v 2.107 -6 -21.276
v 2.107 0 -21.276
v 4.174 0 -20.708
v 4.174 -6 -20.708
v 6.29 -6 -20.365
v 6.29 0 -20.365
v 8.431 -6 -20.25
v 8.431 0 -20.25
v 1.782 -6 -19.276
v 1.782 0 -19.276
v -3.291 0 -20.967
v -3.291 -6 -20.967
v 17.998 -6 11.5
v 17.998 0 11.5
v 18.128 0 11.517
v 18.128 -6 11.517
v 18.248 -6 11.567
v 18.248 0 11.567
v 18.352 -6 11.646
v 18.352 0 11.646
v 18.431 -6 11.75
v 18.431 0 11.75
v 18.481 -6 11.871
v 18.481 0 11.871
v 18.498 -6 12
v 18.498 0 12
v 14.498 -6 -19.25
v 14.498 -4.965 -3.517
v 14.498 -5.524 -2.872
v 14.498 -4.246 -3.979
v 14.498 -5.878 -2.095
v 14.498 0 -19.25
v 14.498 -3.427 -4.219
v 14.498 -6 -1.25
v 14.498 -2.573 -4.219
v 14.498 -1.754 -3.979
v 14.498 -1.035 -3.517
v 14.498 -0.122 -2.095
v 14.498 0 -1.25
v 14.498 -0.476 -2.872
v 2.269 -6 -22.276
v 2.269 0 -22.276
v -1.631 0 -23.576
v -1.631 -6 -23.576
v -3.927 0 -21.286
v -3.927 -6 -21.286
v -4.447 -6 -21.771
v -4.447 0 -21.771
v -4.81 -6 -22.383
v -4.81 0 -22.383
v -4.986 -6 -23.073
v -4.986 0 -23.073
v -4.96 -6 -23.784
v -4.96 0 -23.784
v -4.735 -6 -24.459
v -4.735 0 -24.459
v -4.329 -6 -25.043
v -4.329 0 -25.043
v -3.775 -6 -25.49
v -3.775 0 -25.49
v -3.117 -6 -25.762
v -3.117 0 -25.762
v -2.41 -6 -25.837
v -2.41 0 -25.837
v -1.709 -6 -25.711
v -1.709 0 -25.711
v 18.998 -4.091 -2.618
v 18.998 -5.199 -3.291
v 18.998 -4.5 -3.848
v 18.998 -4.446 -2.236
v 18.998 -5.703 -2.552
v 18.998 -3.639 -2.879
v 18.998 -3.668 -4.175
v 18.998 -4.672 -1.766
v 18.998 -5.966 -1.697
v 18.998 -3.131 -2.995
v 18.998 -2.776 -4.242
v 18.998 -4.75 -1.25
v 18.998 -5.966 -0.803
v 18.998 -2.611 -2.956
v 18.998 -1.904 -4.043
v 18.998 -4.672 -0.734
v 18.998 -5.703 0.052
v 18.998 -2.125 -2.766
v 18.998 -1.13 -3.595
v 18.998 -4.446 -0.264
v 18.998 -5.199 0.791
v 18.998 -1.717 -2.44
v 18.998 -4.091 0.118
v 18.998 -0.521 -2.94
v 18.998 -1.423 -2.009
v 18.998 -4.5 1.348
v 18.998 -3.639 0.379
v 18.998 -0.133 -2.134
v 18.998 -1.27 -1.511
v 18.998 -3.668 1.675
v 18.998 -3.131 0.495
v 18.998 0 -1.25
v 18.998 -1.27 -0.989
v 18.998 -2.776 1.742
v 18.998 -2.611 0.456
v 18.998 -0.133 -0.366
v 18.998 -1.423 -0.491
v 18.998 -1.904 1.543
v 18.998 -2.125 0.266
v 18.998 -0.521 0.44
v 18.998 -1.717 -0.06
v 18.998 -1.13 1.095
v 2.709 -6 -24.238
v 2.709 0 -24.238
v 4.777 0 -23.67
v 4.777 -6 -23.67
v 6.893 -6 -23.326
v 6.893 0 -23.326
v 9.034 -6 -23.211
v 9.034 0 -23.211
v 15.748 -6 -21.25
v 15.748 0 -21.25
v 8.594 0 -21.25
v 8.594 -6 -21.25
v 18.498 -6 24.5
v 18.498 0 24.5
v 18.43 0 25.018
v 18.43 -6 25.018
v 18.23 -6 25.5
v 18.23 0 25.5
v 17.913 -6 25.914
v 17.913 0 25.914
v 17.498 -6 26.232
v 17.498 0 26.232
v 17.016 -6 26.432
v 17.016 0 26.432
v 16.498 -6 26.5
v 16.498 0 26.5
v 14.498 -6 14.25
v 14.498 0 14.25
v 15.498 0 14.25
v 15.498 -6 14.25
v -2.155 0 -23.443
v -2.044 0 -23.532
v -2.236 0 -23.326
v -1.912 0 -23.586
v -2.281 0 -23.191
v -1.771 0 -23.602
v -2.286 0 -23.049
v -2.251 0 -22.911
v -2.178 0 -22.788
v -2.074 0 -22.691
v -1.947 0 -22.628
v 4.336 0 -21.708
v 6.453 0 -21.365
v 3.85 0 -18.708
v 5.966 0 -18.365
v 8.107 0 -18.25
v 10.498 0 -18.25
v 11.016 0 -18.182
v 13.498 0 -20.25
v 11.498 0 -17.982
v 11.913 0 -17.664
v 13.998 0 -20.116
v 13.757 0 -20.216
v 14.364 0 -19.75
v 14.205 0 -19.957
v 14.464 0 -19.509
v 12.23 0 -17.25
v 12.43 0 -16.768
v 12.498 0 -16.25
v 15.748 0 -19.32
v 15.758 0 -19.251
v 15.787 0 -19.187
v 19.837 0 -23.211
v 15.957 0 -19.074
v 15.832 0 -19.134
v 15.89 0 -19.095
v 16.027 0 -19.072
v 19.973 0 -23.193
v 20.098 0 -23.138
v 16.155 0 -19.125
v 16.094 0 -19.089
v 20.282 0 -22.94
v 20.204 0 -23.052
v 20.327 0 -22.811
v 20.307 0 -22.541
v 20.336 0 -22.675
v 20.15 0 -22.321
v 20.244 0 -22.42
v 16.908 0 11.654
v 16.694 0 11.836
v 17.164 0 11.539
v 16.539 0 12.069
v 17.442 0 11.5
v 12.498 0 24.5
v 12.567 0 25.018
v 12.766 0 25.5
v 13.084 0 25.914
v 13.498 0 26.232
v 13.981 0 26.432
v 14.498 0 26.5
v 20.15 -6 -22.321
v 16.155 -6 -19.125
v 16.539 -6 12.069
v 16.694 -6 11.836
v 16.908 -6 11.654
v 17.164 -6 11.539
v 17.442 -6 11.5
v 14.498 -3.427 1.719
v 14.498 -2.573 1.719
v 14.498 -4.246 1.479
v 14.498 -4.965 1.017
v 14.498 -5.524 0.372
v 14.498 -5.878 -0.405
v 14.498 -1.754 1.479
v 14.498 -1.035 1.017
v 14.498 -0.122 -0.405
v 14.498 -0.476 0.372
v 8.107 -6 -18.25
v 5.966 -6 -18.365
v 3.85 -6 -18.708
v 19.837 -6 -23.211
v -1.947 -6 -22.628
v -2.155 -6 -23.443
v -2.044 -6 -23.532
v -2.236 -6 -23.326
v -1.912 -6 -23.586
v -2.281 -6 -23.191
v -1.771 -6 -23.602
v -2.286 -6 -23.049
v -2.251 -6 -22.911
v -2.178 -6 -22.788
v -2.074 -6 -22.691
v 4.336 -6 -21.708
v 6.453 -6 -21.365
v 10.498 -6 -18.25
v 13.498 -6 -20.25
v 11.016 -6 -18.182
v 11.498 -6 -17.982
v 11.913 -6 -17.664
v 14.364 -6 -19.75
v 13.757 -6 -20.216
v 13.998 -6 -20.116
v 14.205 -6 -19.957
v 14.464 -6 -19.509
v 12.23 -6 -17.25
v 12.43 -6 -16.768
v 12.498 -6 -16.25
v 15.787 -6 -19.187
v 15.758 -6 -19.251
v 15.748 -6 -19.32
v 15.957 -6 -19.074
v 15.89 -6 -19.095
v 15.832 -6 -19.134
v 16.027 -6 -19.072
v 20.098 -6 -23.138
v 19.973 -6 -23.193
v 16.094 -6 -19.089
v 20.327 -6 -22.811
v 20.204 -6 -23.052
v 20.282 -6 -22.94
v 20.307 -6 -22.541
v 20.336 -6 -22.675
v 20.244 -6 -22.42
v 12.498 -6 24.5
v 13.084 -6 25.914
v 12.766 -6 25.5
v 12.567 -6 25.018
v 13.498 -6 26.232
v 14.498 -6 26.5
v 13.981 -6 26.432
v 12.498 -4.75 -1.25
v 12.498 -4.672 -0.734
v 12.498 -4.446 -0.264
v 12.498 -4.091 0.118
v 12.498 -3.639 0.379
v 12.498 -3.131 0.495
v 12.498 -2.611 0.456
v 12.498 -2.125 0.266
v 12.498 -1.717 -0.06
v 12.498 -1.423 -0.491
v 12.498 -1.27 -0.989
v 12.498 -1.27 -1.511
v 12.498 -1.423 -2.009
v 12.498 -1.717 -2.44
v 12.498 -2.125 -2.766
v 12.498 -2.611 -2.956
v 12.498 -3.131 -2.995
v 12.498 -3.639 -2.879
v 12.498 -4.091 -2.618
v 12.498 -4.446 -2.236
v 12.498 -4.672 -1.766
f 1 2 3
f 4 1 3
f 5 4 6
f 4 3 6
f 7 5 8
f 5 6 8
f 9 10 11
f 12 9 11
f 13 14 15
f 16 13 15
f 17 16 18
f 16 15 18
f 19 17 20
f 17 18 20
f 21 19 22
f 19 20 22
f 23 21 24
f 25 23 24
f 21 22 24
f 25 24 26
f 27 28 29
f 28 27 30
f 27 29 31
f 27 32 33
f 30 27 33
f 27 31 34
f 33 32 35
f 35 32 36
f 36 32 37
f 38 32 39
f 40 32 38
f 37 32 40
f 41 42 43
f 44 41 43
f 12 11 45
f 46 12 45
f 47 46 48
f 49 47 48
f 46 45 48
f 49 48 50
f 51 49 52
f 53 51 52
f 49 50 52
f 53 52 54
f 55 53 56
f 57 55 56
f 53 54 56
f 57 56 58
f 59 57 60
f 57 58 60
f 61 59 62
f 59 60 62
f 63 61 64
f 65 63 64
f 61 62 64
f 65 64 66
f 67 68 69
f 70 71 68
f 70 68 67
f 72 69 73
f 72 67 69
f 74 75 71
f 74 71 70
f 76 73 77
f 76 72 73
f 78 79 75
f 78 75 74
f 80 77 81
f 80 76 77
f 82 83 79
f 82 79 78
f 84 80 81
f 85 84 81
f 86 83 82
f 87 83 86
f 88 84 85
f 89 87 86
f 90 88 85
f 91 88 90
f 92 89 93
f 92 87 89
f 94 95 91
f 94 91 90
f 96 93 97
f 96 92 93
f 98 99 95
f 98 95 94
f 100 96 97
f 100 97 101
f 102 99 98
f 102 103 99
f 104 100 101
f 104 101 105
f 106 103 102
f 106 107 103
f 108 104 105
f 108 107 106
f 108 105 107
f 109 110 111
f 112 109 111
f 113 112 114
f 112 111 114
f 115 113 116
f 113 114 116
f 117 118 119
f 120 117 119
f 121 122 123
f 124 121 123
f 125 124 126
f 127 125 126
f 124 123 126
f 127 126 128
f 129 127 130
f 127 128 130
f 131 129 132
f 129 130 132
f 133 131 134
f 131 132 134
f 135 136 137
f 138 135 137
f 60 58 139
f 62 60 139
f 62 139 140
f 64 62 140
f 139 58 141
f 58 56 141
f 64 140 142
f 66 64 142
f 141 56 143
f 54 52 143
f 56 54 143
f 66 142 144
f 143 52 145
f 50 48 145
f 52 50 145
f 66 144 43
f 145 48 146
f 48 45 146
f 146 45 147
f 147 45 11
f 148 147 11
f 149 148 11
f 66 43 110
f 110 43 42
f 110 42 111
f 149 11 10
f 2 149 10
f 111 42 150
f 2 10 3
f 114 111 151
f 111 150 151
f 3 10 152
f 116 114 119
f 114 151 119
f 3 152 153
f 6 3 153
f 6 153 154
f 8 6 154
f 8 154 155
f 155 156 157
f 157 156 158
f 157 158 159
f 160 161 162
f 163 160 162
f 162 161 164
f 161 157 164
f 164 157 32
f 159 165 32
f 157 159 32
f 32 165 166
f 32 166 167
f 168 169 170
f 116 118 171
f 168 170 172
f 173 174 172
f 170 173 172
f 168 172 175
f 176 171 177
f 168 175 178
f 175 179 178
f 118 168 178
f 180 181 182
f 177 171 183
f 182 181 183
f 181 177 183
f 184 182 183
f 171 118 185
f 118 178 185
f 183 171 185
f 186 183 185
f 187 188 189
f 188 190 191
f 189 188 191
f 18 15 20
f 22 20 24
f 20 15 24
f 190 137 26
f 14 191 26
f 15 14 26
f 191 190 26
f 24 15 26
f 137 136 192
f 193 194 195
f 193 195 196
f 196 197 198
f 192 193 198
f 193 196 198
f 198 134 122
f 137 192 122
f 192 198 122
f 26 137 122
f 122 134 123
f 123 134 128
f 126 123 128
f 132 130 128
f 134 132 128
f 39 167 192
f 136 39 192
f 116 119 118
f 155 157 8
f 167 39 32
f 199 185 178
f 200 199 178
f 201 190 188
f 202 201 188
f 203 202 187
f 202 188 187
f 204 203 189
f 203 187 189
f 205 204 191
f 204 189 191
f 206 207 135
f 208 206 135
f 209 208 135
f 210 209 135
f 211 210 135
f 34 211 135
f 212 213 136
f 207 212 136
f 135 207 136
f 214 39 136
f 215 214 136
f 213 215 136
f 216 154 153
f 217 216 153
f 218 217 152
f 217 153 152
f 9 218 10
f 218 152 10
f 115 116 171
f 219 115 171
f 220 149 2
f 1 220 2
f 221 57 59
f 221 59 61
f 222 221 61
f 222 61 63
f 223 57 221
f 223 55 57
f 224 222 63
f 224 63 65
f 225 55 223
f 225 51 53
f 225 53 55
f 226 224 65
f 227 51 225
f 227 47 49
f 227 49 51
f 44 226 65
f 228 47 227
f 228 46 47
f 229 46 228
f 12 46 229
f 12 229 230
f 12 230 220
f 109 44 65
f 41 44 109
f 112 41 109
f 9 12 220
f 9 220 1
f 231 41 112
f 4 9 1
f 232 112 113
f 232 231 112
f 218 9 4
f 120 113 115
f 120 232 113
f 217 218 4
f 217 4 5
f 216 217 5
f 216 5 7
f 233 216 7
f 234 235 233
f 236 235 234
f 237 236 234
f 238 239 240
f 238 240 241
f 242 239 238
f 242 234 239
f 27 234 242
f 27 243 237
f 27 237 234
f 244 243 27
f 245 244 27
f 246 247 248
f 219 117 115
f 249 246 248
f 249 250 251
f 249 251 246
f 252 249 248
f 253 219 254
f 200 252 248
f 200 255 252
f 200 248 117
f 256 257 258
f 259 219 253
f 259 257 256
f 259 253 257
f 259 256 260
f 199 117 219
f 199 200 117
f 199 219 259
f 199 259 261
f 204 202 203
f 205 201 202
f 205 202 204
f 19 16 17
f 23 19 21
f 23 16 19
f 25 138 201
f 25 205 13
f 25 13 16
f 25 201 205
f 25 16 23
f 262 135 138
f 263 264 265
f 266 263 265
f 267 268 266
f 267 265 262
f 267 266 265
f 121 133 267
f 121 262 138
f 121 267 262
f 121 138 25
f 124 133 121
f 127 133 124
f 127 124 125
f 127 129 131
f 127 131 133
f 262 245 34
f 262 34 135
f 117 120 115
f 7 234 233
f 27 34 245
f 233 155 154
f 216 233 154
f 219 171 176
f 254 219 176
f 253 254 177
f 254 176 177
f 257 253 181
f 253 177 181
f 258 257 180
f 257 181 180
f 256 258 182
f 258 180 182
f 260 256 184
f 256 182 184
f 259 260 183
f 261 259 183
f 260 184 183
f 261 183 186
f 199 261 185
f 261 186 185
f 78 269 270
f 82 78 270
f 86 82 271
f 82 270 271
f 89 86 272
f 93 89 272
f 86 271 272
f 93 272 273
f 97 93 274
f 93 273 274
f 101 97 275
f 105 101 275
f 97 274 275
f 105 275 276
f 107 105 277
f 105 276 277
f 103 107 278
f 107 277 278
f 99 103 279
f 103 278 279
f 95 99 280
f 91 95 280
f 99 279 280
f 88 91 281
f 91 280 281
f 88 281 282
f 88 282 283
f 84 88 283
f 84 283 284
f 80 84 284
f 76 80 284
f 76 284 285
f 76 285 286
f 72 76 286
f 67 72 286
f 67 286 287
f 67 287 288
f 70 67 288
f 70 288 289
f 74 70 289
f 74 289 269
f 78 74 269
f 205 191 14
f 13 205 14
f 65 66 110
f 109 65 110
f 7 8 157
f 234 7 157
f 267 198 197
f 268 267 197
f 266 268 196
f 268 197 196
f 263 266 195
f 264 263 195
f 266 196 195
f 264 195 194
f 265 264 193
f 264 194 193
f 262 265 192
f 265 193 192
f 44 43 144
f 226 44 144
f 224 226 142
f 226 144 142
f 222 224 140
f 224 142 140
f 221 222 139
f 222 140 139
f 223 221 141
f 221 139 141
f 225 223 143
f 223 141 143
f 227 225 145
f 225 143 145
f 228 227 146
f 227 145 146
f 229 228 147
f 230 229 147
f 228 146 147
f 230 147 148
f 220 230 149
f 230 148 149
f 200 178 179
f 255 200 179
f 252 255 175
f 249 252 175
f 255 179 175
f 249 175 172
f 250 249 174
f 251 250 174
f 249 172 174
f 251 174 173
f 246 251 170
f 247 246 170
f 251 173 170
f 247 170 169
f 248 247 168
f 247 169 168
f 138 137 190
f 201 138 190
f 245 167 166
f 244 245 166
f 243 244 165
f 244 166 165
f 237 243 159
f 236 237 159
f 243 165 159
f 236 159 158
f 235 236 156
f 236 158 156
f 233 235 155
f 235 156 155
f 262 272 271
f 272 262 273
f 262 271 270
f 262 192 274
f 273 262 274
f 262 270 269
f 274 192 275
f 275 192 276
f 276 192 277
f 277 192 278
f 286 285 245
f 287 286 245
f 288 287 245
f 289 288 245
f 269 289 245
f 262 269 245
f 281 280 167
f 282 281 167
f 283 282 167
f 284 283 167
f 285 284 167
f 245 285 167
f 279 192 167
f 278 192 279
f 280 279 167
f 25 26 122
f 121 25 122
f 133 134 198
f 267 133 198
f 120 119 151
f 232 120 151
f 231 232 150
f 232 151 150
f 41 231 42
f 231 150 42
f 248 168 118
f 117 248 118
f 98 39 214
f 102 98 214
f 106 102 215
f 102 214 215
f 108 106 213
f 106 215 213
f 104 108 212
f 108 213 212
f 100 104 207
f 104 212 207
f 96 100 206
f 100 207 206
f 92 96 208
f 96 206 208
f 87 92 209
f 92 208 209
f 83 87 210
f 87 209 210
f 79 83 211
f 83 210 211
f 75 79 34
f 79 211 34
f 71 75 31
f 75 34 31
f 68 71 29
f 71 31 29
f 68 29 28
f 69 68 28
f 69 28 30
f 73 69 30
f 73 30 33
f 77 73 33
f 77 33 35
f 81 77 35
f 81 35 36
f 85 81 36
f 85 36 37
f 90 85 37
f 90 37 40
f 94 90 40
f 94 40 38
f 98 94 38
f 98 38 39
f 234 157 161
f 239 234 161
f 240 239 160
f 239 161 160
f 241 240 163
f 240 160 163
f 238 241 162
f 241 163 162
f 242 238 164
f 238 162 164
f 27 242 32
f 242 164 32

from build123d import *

# Parameters (mm, degrees)
F1_DEPTH = 6
F2_R     = 3
F3_DEPTH = 4.5
F5_D     = 3.5


# Not quite as in the source:
# - ends of sketch curves that miss each other by under 0.0002 mm in the source are joined


with BuildPart() as f1:
    # F0 (on Front) → F1 (new body)
    with BuildSketch(Plane.XZ):
        with BuildLine():
            Line((14.498358, 10), (14.498358, 14))
            Line((14.498358, 14), (14.498358, 14.25))
            Line((14.498358, 14.25), (15.498358, 14.25))
            Line((15.498358, 14.25), (16.539344, 12.069217))
            ThreePointArc((16.539344, 12.069217), (16.9083128035, 11.6541918591), (17.4418, 11.5))
            Line((17.4418, 11.5), (17.998358, 11.5))
            ThreePointArc((17.998358, 11.5), (18.3519113906, 11.6464466094), (18.498358, 12))
            Line((18.498358, 12), (18.498358, 24.5))
            ThreePointArc((18.498358, 24.5), (17.9125715624, 25.9142135624), (16.498358, 26.5))
            Line((16.498358, 26.5), (14.498358, 26.5))
            ThreePointArc((14.498358, 26.5), (13.0841444376, 25.9142135624), (12.498358, 24.5))
            Line((12.498358, 24.5), (12.498358, 22.5))
            Line((12.498358, 22.5), (12.498358, -16.25))
            ThreePointArc((12.498358, -16.25), (11.9125715624, -17.6642135624), (10.498358, -18.25))
            Line((10.498358, -18.25), (8.106805, -18.25))
            ThreePointArc((8.106805, -18.25), (4.9031601399, -18.5082508473), (1.7822496797, -19.276334039))
            Line((1.7822496797, -19.276334039), (-3.290569563, -20.9672737865))
            ThreePointArc((-3.290569563, -20.9672737865), (-4.8717084961, -24.1295514929), (-1.7094308537, -25.710690554))
            Line((-1.7094308537, -25.710690554), (2.709257, -24.237795))
            ThreePointArc((2.709257, -24.237795), (5.8301671399, -23.4697108473), (9.033812, -23.21146))
            Line((9.033812, -23.21146), (19.837293, -23.21146))
            ThreePointArc((19.837293, -23.21146), (20.3091070562, -22.8769637655), (20.1496410116, -22.3210259855))
            Line((20.1496410116, -22.3210259855), (16.154532, -19.124939))
            ThreePointArc((16.154532, -19.124939), (15.8900609581, -19.0948301233), (15.748358, -19.320156))
            Line((15.748358, -19.320156), (15.748358, -21.25))
            Line((15.748358, -21.25), (8.593639, -21.25))
            ThreePointArc((8.593639, -21.25), (5.3899932959, -21.5082508219), (2.2690829797, -22.276333939))
            Line((2.2690829797, -22.276333939), (-1.630813, -23.576299))
            ThreePointArc((-1.630813, -23.576299), (-2.263268599, -23.260072033), (-1.947040883, -22.627616351))
            Line((-1.947040883, -22.627616351), (2.106805, -21.276334))
            ThreePointArc((2.106805, -21.276334), (5.2277158277, -20.5082508979), (8.431361, -20.25))
            Line((8.431361, -20.25), (13.498358, -20.25))
            ThreePointArc((13.498358, -20.25), (14.2054647812, -19.9571067812), (14.498358, -19.25))
            Line((14.498358, -19.25), (14.498358, 10))
        make_face()
    extrude(amount=F1_DEPTH)

    # F2 (on face) → F3 (join)
    with BuildSketch(Plane.YZ.offset(14.498358)):
        with Locations((-3, -1.25)):
            Circle(F2_R)
    extrude(amount=F3_DEPTH)

    # F5 (through all)
    with Locations(Plane.YZ.offset(18.998358)):
        with Locations((-3, -1.25)):
            Hole(F5_D / 2)


solid = f1.part
